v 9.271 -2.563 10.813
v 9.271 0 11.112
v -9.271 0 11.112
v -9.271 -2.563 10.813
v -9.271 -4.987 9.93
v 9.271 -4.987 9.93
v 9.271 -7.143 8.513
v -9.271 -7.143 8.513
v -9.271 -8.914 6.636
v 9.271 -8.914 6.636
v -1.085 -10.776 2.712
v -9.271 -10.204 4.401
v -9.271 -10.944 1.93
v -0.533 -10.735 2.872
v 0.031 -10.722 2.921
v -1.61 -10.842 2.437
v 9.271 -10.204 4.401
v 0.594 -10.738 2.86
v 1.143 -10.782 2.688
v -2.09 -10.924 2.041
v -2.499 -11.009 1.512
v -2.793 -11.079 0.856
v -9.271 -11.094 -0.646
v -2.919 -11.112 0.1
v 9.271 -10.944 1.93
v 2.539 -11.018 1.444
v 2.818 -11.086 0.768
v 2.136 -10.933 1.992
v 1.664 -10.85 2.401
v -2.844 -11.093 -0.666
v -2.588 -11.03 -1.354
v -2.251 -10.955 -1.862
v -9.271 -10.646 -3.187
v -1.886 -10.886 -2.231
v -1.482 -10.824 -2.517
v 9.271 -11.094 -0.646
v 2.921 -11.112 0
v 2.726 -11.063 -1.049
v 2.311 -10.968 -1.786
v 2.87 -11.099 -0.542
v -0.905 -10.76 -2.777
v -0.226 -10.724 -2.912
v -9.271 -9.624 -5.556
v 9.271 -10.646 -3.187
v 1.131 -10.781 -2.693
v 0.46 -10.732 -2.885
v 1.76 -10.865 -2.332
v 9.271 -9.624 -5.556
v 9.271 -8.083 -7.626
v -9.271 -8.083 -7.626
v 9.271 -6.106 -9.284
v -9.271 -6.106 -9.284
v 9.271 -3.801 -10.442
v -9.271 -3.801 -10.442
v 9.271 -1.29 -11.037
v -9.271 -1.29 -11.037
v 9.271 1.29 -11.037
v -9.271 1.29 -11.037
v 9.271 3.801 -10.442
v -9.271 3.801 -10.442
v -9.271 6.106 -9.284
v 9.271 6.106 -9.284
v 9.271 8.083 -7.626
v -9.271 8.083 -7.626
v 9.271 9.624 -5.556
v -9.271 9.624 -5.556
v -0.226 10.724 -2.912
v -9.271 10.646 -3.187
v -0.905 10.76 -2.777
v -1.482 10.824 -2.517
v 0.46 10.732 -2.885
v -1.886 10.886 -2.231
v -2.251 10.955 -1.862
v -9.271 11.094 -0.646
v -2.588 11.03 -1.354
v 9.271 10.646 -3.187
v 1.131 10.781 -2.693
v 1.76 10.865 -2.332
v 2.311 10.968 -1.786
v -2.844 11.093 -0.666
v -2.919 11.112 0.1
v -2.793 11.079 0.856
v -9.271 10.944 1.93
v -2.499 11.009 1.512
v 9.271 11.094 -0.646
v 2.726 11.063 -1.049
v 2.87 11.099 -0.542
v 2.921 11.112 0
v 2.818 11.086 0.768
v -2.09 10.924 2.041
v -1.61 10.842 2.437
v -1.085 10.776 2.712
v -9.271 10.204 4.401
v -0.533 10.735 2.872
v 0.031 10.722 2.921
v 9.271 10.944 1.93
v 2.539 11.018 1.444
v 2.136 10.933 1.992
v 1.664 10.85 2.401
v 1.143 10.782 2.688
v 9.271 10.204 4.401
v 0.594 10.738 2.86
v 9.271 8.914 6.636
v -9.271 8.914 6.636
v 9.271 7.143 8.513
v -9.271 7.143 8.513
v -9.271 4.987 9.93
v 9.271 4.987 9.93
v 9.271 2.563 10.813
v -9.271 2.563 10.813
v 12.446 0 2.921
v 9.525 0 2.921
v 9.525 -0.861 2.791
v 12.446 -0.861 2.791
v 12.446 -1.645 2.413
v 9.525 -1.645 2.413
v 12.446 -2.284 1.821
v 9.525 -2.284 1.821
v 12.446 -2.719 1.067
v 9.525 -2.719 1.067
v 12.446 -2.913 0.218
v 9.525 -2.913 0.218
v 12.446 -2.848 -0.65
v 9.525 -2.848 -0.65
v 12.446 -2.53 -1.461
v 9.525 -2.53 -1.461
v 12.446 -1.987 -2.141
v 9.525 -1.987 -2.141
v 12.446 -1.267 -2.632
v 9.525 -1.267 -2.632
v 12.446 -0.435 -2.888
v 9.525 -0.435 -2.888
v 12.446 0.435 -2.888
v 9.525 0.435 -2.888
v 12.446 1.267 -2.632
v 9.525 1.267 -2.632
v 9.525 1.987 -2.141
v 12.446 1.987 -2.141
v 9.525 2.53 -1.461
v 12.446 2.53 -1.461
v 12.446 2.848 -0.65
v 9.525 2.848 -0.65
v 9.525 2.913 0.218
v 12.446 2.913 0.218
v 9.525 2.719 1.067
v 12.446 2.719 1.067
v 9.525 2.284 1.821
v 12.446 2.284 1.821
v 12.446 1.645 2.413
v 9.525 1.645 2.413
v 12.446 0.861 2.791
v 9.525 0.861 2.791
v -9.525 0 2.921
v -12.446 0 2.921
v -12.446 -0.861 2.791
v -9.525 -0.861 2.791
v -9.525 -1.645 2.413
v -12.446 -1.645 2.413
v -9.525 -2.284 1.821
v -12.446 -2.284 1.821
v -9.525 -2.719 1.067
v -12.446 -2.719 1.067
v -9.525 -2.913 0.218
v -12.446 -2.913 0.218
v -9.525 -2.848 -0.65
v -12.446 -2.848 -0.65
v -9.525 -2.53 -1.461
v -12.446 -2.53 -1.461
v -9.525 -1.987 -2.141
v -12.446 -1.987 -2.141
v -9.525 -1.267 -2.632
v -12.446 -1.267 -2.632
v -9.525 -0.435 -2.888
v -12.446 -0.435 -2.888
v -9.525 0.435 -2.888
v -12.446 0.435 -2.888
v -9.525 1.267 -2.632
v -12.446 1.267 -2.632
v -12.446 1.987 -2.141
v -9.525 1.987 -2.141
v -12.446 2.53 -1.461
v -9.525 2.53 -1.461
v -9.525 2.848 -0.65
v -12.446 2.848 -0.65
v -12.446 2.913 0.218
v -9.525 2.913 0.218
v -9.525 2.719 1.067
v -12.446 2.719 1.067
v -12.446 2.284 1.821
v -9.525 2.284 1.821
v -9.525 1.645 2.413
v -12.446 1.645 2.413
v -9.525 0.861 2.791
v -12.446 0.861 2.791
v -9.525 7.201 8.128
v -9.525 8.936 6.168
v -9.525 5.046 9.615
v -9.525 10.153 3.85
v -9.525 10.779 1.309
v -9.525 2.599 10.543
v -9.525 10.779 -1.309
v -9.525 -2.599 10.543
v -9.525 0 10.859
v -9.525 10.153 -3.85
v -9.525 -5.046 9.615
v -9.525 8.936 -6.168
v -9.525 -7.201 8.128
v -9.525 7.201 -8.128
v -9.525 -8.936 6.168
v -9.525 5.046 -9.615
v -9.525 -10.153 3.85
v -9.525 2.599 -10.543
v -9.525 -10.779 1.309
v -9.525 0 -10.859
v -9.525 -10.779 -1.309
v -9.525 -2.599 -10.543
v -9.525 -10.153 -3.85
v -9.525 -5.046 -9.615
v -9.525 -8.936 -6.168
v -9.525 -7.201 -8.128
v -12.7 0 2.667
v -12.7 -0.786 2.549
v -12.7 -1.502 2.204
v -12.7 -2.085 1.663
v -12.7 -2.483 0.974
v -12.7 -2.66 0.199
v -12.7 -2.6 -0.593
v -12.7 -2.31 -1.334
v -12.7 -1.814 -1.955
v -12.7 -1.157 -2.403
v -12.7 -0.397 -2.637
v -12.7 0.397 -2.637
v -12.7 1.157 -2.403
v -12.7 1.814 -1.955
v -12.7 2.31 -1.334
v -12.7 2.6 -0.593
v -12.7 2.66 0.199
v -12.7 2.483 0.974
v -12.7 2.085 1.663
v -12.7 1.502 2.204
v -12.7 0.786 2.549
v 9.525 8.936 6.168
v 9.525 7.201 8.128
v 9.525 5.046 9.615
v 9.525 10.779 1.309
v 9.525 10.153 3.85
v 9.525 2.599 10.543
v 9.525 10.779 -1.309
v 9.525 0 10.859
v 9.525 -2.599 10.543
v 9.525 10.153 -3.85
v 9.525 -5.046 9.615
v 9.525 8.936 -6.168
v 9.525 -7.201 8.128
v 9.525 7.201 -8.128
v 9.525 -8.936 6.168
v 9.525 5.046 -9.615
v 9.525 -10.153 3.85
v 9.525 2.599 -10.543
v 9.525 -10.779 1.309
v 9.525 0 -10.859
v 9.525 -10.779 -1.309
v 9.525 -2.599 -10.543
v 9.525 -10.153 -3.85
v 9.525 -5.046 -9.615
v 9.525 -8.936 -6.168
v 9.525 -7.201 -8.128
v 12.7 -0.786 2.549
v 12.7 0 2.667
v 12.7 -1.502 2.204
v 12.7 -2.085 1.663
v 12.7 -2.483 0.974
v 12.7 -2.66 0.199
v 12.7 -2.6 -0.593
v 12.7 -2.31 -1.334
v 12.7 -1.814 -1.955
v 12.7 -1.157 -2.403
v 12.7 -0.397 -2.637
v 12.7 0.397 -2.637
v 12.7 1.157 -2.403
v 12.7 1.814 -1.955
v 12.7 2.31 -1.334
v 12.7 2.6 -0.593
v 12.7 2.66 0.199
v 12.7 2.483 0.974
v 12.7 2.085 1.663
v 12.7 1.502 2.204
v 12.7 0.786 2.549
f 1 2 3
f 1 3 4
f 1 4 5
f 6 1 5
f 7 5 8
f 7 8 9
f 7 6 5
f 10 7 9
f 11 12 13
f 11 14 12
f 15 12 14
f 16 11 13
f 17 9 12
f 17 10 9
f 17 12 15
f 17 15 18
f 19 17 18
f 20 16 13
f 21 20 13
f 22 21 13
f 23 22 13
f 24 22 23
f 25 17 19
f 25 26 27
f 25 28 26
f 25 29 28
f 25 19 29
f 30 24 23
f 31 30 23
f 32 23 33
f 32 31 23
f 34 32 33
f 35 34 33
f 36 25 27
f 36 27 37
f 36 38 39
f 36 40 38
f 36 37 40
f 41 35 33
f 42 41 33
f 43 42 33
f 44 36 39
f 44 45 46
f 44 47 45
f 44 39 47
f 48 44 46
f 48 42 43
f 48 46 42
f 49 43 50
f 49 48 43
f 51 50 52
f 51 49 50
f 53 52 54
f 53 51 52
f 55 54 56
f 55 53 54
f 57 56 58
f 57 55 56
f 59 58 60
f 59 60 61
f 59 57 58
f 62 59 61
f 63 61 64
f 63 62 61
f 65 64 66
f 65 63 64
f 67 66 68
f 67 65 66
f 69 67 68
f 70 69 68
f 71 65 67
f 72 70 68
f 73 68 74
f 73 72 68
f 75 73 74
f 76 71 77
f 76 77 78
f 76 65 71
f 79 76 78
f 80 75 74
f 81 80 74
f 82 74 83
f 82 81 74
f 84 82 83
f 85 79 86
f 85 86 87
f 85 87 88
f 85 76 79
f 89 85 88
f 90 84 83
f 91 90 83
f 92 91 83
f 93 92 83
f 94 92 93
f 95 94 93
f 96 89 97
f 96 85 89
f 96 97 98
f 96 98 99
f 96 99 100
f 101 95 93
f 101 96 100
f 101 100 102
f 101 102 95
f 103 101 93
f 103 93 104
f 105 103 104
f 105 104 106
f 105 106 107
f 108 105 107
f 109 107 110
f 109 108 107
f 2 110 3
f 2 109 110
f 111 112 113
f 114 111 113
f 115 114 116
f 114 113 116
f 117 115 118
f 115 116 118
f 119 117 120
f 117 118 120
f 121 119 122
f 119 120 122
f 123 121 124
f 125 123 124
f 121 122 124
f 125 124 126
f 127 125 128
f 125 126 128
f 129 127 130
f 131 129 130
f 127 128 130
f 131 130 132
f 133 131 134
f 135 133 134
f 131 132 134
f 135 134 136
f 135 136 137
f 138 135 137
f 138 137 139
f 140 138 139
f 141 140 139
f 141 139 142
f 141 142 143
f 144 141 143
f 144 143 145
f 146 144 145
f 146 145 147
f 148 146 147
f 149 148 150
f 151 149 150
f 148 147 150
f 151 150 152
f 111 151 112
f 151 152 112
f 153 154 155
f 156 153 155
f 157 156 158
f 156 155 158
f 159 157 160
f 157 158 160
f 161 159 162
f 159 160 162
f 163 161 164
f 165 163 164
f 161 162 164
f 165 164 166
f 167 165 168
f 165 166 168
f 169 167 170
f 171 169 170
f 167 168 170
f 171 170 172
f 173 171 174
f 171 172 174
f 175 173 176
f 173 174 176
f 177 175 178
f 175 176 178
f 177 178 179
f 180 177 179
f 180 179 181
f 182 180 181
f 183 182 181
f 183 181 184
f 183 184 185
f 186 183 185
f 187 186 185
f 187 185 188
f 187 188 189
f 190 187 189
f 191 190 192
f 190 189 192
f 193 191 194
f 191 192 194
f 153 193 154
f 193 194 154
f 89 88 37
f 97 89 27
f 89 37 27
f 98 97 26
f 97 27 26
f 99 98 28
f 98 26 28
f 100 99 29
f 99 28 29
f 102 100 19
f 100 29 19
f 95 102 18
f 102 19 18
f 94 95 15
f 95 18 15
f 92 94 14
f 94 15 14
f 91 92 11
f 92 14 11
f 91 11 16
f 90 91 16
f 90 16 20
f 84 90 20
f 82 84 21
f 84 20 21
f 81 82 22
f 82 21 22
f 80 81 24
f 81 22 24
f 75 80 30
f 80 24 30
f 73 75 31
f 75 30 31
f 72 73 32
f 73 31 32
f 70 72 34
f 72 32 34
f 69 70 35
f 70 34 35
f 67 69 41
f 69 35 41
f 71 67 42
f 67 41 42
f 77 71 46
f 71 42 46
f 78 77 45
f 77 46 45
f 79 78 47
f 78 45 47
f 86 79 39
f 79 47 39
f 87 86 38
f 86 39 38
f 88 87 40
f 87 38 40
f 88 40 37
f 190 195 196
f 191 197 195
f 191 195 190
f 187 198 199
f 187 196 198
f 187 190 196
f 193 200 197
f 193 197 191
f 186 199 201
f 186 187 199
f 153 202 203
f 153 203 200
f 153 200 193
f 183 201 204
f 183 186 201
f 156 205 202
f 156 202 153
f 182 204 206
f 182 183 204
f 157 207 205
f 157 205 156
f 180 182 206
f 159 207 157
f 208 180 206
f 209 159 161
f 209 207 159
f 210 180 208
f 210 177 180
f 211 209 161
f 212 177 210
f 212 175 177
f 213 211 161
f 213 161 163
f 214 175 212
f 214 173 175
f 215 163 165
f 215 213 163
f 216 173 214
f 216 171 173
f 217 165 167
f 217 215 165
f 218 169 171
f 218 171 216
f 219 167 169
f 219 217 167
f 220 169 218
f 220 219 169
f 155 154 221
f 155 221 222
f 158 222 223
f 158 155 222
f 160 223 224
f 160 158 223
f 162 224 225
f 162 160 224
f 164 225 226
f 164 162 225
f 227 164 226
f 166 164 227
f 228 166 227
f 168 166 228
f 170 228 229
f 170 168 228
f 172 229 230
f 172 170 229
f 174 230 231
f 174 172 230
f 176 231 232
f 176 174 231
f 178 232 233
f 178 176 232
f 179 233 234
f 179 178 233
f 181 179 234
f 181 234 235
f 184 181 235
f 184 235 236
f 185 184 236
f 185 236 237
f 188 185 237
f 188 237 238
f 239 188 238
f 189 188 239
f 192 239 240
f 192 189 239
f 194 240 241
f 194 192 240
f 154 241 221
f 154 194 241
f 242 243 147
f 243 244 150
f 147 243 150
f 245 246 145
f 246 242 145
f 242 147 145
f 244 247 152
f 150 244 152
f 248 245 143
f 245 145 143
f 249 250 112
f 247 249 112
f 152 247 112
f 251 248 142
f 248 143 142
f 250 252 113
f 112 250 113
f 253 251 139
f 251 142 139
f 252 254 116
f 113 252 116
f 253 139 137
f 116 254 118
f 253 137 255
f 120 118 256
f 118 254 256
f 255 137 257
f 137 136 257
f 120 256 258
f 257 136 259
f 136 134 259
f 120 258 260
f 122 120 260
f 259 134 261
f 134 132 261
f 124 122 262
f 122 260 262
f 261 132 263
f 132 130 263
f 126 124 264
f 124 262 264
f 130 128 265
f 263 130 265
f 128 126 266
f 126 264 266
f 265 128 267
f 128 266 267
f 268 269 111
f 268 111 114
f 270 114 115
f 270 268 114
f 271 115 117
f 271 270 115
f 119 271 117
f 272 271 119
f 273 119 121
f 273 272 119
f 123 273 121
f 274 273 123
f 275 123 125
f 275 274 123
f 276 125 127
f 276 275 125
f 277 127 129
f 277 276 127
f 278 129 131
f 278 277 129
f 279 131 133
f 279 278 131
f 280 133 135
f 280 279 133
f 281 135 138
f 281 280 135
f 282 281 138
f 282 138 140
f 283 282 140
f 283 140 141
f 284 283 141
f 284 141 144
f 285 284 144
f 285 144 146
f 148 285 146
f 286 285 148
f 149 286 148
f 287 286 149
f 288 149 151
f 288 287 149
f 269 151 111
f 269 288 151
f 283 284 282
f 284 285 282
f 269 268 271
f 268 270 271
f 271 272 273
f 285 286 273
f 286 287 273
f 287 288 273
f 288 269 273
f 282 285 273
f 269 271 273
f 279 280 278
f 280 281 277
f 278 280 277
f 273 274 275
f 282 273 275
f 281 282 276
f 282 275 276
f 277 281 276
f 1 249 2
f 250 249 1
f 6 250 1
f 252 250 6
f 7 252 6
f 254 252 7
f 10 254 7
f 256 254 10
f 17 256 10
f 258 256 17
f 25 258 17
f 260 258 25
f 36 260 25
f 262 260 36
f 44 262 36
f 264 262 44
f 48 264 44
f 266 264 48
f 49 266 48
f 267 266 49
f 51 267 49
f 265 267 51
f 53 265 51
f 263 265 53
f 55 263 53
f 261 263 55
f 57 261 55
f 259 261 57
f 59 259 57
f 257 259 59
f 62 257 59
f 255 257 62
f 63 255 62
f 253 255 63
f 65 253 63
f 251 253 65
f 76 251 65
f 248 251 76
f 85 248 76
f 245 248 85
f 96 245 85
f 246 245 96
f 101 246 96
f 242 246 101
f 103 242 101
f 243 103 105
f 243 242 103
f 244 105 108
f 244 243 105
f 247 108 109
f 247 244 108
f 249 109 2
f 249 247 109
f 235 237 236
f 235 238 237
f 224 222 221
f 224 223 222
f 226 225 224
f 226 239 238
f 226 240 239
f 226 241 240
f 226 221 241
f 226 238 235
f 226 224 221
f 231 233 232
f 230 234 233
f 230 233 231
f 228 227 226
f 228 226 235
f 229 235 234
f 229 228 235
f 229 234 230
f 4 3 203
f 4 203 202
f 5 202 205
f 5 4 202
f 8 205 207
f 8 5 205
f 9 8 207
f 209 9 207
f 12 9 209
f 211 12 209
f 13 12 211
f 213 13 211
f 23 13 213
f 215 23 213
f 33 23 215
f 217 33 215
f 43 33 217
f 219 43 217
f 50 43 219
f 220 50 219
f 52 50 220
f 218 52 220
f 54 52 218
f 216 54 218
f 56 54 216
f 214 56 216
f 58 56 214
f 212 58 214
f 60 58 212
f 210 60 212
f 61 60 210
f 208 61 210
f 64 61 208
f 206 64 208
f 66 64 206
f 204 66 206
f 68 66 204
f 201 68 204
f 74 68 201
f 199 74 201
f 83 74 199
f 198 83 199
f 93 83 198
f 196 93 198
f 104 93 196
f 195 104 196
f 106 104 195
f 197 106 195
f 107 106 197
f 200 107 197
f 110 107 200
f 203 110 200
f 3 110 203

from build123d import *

# Parameters (mm, degrees)
F0_W     = 3.175
F0_H     = 2.921
F0_W_2   = 19.05
F0_H_2   = 8.1915
F2_R     = 2.921
F3_DEPTH = 254
F4_SIZE  = 0.254


with BuildPart() as f1:
    # F0 (on Front) → F1 (revolve)
    with BuildSketch(Plane.XZ):
        with Locations((-11.1125, 1.4605)):
            Rectangle(F0_W, F0_H)
        with Locations((0, 1.4605)):
            Rectangle(F0_W_2, F0_H)
        with Locations((11.1125, 1.4605)):
            Rectangle(F0_W, F0_H)
        with Locations((0, 7.01675)):
            Rectangle(F0_W_2, F0_H_2)
    revolve(axis=Axis((0, 0, 0), (1, 0, 0)))

    # F2 (on Front) → F3 (cut, symmetric)
    with BuildSketch(Plane.XZ):
        Circle(F2_R)
    extrude(amount=F3_DEPTH, both=True, mode=Mode.SUBTRACT)

    # F4
    f4_edges = [f1.edges().sort_by_distance(p)[0] for p in [
        (-12.7, 0, -2.921),
        (-9.525, 0, -11.1125),
        (9.525, 0, -11.1125),
        (12.7, 0, -2.921),
    ]]
    chamfer(f4_edges, length=F4_SIZE)


solid = f1.part
